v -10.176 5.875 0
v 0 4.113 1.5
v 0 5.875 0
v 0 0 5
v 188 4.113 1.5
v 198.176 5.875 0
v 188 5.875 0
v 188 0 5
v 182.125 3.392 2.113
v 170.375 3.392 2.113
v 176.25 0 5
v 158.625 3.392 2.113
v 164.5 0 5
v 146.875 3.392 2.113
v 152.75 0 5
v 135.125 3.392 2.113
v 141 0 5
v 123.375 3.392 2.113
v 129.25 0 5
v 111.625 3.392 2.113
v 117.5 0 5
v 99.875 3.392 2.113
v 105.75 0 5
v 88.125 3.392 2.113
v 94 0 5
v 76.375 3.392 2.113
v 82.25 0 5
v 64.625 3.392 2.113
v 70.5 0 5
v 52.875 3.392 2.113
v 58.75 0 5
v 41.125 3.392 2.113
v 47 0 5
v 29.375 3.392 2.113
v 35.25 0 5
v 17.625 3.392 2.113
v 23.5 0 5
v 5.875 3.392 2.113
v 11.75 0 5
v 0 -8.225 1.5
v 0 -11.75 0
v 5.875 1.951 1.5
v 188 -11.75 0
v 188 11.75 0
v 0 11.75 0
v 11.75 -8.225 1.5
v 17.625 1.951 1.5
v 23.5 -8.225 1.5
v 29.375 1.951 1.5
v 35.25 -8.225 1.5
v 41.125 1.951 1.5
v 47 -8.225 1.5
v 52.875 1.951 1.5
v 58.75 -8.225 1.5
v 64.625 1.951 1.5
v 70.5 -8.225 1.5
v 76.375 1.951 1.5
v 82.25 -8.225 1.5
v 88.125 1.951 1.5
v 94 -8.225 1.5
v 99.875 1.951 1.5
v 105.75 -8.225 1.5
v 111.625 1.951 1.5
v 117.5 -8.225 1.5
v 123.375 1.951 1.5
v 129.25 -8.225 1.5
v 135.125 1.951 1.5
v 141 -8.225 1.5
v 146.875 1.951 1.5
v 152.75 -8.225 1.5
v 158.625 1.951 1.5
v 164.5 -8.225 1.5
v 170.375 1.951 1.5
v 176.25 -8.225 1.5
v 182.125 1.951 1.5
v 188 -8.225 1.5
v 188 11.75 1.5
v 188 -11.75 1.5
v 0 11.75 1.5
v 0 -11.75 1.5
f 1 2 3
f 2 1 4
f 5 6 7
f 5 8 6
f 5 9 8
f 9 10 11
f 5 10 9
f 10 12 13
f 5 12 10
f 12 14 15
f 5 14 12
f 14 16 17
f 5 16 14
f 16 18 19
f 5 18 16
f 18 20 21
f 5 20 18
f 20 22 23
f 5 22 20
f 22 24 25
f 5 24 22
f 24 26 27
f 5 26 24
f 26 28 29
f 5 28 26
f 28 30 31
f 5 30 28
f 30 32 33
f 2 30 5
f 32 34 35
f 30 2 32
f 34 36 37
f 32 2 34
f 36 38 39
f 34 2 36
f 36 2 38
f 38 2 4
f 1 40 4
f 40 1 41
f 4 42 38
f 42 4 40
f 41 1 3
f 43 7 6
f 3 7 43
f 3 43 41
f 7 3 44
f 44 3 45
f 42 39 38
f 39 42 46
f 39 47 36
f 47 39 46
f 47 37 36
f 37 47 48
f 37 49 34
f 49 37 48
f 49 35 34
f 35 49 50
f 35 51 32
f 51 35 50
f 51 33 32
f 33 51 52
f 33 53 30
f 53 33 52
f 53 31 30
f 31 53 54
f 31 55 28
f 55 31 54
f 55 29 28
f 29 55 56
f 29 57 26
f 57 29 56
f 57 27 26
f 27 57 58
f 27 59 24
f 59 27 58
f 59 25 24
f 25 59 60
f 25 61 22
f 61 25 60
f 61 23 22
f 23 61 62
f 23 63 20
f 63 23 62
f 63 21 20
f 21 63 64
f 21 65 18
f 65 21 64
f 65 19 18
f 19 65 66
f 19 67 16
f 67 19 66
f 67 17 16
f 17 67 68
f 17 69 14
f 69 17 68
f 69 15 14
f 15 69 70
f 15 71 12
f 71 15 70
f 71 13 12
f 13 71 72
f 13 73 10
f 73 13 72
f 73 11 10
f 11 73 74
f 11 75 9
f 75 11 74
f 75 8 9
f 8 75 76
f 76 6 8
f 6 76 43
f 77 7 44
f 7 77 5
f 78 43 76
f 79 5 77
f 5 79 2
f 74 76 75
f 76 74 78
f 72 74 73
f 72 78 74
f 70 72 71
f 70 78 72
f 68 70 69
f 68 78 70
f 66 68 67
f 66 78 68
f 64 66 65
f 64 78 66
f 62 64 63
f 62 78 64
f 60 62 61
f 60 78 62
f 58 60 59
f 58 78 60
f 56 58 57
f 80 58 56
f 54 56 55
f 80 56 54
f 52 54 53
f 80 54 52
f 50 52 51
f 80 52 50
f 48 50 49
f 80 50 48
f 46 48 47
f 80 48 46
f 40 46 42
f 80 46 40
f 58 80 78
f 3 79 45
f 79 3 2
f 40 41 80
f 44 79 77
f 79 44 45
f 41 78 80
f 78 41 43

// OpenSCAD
$r = 23.5/2;
$r2 = 11 / 2;
$d = 1.5;
$fn = 3;
$links = 16;

difference() {
    union() {
for (i = [0:$links]) {
    
     translate([i * $r, 0, 2.5]) {
        rotate([0, 0, 30]) {
            cylinder(5, $r, 0, true);
        }
     }
}
translate([0, -$r, 0]) {
     cube([$r * ($links ), $r*2 , $d], false);
}
}
translate([-10, 0, 0]) {
    //cube([20, 20, 20], true);
}
translate([($links) * $r + 10, 0, 0]) {
    //cube([20, 20, 20], true);
}
}
